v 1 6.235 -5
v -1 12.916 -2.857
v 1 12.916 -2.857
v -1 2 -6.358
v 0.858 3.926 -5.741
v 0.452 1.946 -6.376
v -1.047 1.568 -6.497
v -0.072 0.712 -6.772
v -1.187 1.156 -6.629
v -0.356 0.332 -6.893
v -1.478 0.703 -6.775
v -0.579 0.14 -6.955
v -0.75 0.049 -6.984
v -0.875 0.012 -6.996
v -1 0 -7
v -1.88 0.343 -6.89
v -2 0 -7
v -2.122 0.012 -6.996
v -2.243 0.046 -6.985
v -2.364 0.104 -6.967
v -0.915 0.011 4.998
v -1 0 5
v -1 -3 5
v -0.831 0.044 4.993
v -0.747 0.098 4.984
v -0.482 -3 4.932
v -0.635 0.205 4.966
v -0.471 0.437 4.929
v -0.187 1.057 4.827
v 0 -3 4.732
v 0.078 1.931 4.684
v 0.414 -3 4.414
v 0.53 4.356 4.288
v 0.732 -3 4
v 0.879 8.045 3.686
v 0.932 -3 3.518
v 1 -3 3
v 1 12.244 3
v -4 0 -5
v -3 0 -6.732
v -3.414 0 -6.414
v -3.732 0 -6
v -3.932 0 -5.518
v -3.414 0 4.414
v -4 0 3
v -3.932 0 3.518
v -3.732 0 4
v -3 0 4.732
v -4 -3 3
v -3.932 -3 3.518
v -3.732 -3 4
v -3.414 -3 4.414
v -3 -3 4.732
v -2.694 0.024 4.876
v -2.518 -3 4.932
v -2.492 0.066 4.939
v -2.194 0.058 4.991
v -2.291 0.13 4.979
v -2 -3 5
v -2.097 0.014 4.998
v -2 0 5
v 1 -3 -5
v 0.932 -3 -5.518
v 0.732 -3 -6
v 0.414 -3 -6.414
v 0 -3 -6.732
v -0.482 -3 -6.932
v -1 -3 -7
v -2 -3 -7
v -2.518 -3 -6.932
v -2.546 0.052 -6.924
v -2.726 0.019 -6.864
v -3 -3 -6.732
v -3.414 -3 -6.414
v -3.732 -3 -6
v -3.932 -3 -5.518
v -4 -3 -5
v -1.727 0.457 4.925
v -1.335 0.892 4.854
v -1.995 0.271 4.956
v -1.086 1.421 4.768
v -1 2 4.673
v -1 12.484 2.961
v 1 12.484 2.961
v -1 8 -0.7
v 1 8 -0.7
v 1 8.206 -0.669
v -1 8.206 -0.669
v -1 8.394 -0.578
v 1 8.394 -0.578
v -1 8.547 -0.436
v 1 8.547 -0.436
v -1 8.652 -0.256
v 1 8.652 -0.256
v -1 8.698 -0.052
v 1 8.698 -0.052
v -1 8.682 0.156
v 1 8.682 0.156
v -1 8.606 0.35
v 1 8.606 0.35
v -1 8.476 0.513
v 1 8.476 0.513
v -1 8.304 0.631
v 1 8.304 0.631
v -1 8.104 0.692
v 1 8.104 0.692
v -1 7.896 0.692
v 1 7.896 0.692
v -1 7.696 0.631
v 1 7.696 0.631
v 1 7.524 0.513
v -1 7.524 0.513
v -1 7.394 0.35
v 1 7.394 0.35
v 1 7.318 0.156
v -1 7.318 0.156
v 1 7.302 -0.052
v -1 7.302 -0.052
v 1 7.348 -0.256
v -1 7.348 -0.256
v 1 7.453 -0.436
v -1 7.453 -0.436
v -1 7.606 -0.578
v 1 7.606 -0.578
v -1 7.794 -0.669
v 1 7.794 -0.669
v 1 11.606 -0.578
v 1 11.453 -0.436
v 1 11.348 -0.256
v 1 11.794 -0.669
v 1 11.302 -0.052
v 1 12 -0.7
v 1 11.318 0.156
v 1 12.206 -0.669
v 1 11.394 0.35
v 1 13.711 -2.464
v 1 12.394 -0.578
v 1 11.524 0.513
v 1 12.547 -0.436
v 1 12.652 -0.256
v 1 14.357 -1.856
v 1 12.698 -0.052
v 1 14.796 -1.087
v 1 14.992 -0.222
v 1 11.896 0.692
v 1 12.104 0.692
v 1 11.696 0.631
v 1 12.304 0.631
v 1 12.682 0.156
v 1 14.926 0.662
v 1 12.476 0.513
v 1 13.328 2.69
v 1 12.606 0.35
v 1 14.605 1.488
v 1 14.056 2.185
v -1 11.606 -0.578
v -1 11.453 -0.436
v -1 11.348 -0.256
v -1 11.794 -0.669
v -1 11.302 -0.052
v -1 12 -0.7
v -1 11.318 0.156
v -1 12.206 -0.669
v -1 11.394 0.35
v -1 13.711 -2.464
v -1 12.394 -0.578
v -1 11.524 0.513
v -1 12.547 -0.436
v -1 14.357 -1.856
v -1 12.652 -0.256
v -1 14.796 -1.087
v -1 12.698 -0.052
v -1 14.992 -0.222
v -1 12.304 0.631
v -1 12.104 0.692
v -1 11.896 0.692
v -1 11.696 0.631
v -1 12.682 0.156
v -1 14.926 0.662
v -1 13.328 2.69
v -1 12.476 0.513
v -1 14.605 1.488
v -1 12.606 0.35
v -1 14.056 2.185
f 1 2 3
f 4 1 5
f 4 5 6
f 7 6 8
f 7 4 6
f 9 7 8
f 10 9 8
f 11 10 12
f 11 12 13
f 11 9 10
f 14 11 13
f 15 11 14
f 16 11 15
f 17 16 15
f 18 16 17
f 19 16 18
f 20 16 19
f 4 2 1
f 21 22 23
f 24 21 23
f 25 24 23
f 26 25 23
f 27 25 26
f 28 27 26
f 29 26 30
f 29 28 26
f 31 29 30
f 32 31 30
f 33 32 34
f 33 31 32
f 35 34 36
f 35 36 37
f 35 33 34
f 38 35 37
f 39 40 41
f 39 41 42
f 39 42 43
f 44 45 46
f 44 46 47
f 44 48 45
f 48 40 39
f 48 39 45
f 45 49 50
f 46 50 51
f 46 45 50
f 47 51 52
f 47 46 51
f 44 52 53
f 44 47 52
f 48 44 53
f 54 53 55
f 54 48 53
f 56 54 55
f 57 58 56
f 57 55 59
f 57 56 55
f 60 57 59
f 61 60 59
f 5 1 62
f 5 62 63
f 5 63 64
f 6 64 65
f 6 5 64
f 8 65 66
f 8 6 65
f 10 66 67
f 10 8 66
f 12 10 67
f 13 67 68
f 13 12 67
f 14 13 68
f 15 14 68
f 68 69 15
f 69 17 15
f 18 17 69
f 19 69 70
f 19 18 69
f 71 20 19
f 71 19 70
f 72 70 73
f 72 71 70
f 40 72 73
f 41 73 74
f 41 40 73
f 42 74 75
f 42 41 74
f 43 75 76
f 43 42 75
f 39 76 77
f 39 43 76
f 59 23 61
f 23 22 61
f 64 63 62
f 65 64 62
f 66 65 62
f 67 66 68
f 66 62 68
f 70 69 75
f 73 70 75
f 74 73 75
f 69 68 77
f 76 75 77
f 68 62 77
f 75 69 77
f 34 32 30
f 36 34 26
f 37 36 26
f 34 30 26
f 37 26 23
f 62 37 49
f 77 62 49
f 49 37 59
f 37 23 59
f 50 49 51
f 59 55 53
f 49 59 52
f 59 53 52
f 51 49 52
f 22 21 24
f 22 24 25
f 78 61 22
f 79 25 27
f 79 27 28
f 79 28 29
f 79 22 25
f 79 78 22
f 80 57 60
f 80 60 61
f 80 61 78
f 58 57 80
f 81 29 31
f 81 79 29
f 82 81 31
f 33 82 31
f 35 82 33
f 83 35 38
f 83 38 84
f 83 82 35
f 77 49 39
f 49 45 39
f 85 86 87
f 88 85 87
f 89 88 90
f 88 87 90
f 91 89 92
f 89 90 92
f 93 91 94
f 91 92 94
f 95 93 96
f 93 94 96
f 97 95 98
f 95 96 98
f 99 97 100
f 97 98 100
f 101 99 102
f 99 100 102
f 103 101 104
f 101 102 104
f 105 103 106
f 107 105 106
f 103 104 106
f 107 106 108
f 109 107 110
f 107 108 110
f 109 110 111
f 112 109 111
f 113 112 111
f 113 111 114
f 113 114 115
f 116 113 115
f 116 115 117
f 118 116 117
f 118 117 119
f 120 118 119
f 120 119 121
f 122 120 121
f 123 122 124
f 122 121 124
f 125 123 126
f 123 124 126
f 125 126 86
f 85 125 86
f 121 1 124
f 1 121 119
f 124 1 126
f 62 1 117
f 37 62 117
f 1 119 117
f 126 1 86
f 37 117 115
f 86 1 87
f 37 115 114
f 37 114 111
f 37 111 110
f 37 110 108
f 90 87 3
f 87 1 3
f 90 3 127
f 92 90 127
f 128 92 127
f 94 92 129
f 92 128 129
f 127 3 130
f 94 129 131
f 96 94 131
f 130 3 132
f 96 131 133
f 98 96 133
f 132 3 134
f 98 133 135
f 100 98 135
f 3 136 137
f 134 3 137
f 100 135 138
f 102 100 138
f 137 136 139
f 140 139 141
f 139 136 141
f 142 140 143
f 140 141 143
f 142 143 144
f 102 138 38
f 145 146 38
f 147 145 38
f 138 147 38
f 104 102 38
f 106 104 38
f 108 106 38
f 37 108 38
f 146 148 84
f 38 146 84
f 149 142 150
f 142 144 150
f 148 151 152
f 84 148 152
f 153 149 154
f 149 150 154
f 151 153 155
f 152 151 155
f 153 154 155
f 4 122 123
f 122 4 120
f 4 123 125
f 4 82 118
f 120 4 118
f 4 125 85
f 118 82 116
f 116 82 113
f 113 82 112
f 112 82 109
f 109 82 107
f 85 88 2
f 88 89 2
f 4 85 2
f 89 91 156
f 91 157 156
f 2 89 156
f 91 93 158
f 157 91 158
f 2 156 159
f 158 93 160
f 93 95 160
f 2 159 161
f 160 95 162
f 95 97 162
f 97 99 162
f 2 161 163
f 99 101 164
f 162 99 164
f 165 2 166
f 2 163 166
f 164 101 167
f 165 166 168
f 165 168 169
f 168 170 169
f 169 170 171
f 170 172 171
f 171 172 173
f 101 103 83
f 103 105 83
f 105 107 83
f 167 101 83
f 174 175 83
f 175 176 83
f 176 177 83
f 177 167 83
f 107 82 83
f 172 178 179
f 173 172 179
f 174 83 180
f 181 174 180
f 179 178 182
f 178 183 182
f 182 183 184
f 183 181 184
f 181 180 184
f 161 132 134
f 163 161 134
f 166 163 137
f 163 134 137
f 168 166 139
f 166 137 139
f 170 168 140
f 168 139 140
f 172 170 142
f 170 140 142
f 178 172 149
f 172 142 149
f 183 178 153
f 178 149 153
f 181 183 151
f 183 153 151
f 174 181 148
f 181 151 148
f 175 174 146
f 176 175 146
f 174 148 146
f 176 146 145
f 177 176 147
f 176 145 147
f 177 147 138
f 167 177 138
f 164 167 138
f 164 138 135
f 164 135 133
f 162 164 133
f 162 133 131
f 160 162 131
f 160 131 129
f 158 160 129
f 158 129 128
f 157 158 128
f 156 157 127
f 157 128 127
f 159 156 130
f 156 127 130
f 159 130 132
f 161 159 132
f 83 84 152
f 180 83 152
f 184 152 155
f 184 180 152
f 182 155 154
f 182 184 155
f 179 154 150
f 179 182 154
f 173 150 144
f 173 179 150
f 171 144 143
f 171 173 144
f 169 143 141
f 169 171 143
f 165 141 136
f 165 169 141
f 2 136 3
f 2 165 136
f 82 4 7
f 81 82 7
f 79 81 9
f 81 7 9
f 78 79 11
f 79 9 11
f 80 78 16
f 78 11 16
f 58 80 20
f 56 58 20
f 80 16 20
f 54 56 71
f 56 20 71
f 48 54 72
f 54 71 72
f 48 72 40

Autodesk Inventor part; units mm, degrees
ref_plane "YZ Plane" through (0, 0, 0) normal (1, 0, 0) x (0, 1, 0)
ref_plane "XZ Plane" through (0, 0, 0) normal (0, 1, 0) x (-1, 0, 0)
ref_plane "XY Plane" through (0, 0, 0) normal (0, 0, 1) x (1, 0, 0)
sketch "Skizze1" plane through (0, 0, 0) normal (1, 0, 0) x (0, 1, 0)
  arc A0 (12.9164, -2.8566) -> (12.4836, 2.9608) centre (12, 0) ccw
  line L0 (12.9164, -2.8566) -> (0, -7)
  line L1 (0, -7) -> (0, 5)
  line L2 (0, 5) -> (12.4836, 2.9608)
  point P0 (0, 0)
  dimension "d0" = 3
  dimension "d1" = 12
  dimension "d2" = 12
  dimension "d3" = 5
extrude "Extrusion1" add sketch "Skizze1" along normal mid plane 2
sketch "Skizze2" plane through (0, 0, 0) normal (0, 1, 0) x (-1, 0, 0)
  line L0 (-1, 2.9608) -> (-1, 5) projected
  line L1 (-1, 5) -> (4, 5)
  line L2 (4, 5) -> (4, -7)
  line L3 (4, -7) -> (-1, -7)
  line L4 (-1, -7) -> (-1, 5)
  line L5 (1, -7) -> (-1, -7) projected
  point P0 (0, 0)
  dimension "d6" = 5
extrude "Extrusion2" add sketch "Skizze2" against normal blind 3
fillet "Rundung1" radius 2 1 edges at (-1, 0, -1)
sketch "Skizze3" plane through (1, 0, 0) normal (1, 0, 0) x (0, 0, -1)
  arc A0 (2.8566, 12.9164) -> (-2.9608, 12.4836) centre (0, 12) ccw projected
  circle A1 centre (0, 12) radius 0.7
  line L0 (0, 12) -> (0, -3) construction
  line L1 (7, -3) -> (-5, -3) projected
  circle A2 centre (0, 8) radius 0.7
  point P0 (0, 0)
  dimension "d10" = 1.4
  dimension "d13" = 4
extrude "Extrusion3" cut sketch "Skizze3" against normal blind 4.75
fillet "Rundung2" radius 2 4 edges at (-4, -1.5, 5) (1, -1.5, 5) (1, -1.5, -7) (-4, -1.5, -7)
properties part number "P_Wing_aileron_lever"
